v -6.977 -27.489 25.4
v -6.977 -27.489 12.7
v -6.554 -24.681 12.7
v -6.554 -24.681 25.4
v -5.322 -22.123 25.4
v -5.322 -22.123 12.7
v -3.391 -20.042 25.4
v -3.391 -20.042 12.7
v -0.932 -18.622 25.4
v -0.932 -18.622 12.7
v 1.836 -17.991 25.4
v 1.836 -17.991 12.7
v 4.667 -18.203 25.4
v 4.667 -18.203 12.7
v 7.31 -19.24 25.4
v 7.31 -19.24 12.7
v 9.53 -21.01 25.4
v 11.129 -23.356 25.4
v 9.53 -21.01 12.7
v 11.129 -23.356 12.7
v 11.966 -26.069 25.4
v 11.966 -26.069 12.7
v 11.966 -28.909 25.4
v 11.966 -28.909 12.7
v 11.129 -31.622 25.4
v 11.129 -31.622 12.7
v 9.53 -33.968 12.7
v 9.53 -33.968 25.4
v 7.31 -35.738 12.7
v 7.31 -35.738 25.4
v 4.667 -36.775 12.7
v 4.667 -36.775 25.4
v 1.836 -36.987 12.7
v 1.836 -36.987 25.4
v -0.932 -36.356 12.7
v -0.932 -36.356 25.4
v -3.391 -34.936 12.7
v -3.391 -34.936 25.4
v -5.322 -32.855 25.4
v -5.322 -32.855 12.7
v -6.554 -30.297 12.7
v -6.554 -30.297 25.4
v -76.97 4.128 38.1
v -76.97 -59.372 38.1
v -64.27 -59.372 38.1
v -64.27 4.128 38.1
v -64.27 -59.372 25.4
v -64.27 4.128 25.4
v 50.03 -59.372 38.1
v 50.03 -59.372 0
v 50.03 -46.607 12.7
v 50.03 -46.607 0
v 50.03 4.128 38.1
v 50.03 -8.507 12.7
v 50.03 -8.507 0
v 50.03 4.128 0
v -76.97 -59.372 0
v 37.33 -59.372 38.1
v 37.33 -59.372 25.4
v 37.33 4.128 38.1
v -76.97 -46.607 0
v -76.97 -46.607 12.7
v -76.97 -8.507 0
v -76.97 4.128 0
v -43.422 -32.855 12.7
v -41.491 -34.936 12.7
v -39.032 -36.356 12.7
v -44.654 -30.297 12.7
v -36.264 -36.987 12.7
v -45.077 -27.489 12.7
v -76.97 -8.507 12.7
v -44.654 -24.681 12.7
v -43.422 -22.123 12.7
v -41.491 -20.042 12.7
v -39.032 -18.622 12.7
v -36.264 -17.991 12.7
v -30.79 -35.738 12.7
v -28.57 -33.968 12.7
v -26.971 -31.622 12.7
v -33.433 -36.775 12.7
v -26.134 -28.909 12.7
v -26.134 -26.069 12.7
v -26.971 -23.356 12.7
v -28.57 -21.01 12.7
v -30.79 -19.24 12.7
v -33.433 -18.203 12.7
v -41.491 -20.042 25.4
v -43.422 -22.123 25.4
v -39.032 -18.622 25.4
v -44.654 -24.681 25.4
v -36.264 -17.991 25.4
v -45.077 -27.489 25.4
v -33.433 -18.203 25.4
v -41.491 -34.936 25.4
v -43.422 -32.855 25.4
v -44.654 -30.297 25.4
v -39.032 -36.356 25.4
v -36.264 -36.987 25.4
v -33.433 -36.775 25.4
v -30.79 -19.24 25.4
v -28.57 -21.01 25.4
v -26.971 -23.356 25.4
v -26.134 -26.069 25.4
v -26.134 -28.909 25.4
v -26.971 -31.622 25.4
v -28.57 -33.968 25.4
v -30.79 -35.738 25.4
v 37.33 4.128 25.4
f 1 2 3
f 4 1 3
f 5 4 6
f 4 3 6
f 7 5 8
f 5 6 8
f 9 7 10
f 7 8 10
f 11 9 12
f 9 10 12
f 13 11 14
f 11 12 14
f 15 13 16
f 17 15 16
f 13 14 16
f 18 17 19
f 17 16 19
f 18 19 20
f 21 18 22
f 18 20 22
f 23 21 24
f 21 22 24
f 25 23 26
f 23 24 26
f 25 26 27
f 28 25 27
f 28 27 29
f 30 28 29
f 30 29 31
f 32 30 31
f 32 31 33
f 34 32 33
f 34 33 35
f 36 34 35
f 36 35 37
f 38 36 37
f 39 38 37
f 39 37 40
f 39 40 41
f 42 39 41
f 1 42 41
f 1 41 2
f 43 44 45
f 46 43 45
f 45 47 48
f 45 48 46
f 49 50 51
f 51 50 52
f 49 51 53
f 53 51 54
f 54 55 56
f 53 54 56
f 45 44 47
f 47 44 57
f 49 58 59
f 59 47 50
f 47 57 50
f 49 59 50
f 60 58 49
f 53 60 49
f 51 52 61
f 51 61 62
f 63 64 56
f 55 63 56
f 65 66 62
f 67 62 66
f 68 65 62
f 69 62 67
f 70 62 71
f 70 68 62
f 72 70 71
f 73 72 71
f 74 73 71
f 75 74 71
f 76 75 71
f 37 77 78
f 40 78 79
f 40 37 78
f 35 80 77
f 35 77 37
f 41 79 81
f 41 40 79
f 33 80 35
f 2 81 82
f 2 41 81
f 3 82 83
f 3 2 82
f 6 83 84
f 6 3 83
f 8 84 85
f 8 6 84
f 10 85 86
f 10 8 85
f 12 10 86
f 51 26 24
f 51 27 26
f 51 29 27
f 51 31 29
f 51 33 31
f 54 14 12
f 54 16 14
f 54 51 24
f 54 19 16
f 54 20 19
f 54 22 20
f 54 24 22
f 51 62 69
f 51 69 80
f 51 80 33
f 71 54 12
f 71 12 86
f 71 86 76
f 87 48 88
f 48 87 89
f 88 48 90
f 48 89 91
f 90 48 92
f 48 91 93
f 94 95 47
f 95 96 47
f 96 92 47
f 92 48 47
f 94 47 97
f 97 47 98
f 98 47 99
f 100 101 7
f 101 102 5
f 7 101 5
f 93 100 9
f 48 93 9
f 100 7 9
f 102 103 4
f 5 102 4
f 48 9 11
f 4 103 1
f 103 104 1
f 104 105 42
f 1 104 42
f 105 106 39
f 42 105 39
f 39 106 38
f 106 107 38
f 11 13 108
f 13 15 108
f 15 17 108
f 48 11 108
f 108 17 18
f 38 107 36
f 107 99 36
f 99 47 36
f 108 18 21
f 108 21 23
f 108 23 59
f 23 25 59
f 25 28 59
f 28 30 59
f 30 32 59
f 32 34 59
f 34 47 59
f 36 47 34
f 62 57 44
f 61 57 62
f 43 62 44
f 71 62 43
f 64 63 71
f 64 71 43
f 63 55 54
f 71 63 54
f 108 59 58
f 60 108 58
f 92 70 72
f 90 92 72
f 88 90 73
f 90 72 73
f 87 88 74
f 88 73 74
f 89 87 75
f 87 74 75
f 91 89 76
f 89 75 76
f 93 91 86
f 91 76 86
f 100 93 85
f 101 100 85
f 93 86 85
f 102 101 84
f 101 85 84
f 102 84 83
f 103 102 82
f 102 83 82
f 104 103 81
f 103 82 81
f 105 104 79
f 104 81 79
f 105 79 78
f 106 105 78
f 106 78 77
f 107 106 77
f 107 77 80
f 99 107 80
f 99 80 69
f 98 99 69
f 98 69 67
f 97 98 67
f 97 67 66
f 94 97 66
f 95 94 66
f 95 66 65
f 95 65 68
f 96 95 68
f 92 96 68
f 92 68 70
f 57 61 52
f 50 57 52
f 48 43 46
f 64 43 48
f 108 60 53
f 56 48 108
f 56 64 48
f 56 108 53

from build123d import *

# Parameters (mm, degrees)
F0_W     = 127
F0_H     = 63.5
F1_DEPTH = 38.1
F2_W     = 101.6
F2_H     = 12.7
F3_DEPTH = 63.5
F4_W     = 38.1
F4_H     = 12.7
F5_DEPTH = 127.001
F7_D     = 19.05


with BuildPart() as f1:
    # F0 (on Top) → F1 (new body)
    with BuildSketch(Plane.XY):
        with Locations((-13.469666, -27.621665)):
            Rectangle(F0_W, F0_H)
    extrude(amount=F1_DEPTH)

    # F2 (on face) → F3 (cut, through all)
    with BuildSketch(Plane.XZ.offset(59.371665)):
        with Locations((-13.469666, 31.75)):
            Rectangle(F2_W, F2_H)
    extrude(amount=-F3_DEPTH, mode=Mode.SUBTRACT)

    # F4 (on face) → F5 (cut, through all)
    with BuildSketch(Plane.YZ.offset(50.030334)):
        with Locations((-27.556809, 6.35)):
            Rectangle(F4_W, F4_H)
    extrude(amount=-F5_DEPTH, mode=Mode.SUBTRACT)

    # F7 (through all)
    with Locations(Plane.XY.offset(25.4)):
        with Locations((-35.552364, -27.488971), (2.547636, -27.488971)):
            Hole(F7_D / 2)


solid = f1.part
